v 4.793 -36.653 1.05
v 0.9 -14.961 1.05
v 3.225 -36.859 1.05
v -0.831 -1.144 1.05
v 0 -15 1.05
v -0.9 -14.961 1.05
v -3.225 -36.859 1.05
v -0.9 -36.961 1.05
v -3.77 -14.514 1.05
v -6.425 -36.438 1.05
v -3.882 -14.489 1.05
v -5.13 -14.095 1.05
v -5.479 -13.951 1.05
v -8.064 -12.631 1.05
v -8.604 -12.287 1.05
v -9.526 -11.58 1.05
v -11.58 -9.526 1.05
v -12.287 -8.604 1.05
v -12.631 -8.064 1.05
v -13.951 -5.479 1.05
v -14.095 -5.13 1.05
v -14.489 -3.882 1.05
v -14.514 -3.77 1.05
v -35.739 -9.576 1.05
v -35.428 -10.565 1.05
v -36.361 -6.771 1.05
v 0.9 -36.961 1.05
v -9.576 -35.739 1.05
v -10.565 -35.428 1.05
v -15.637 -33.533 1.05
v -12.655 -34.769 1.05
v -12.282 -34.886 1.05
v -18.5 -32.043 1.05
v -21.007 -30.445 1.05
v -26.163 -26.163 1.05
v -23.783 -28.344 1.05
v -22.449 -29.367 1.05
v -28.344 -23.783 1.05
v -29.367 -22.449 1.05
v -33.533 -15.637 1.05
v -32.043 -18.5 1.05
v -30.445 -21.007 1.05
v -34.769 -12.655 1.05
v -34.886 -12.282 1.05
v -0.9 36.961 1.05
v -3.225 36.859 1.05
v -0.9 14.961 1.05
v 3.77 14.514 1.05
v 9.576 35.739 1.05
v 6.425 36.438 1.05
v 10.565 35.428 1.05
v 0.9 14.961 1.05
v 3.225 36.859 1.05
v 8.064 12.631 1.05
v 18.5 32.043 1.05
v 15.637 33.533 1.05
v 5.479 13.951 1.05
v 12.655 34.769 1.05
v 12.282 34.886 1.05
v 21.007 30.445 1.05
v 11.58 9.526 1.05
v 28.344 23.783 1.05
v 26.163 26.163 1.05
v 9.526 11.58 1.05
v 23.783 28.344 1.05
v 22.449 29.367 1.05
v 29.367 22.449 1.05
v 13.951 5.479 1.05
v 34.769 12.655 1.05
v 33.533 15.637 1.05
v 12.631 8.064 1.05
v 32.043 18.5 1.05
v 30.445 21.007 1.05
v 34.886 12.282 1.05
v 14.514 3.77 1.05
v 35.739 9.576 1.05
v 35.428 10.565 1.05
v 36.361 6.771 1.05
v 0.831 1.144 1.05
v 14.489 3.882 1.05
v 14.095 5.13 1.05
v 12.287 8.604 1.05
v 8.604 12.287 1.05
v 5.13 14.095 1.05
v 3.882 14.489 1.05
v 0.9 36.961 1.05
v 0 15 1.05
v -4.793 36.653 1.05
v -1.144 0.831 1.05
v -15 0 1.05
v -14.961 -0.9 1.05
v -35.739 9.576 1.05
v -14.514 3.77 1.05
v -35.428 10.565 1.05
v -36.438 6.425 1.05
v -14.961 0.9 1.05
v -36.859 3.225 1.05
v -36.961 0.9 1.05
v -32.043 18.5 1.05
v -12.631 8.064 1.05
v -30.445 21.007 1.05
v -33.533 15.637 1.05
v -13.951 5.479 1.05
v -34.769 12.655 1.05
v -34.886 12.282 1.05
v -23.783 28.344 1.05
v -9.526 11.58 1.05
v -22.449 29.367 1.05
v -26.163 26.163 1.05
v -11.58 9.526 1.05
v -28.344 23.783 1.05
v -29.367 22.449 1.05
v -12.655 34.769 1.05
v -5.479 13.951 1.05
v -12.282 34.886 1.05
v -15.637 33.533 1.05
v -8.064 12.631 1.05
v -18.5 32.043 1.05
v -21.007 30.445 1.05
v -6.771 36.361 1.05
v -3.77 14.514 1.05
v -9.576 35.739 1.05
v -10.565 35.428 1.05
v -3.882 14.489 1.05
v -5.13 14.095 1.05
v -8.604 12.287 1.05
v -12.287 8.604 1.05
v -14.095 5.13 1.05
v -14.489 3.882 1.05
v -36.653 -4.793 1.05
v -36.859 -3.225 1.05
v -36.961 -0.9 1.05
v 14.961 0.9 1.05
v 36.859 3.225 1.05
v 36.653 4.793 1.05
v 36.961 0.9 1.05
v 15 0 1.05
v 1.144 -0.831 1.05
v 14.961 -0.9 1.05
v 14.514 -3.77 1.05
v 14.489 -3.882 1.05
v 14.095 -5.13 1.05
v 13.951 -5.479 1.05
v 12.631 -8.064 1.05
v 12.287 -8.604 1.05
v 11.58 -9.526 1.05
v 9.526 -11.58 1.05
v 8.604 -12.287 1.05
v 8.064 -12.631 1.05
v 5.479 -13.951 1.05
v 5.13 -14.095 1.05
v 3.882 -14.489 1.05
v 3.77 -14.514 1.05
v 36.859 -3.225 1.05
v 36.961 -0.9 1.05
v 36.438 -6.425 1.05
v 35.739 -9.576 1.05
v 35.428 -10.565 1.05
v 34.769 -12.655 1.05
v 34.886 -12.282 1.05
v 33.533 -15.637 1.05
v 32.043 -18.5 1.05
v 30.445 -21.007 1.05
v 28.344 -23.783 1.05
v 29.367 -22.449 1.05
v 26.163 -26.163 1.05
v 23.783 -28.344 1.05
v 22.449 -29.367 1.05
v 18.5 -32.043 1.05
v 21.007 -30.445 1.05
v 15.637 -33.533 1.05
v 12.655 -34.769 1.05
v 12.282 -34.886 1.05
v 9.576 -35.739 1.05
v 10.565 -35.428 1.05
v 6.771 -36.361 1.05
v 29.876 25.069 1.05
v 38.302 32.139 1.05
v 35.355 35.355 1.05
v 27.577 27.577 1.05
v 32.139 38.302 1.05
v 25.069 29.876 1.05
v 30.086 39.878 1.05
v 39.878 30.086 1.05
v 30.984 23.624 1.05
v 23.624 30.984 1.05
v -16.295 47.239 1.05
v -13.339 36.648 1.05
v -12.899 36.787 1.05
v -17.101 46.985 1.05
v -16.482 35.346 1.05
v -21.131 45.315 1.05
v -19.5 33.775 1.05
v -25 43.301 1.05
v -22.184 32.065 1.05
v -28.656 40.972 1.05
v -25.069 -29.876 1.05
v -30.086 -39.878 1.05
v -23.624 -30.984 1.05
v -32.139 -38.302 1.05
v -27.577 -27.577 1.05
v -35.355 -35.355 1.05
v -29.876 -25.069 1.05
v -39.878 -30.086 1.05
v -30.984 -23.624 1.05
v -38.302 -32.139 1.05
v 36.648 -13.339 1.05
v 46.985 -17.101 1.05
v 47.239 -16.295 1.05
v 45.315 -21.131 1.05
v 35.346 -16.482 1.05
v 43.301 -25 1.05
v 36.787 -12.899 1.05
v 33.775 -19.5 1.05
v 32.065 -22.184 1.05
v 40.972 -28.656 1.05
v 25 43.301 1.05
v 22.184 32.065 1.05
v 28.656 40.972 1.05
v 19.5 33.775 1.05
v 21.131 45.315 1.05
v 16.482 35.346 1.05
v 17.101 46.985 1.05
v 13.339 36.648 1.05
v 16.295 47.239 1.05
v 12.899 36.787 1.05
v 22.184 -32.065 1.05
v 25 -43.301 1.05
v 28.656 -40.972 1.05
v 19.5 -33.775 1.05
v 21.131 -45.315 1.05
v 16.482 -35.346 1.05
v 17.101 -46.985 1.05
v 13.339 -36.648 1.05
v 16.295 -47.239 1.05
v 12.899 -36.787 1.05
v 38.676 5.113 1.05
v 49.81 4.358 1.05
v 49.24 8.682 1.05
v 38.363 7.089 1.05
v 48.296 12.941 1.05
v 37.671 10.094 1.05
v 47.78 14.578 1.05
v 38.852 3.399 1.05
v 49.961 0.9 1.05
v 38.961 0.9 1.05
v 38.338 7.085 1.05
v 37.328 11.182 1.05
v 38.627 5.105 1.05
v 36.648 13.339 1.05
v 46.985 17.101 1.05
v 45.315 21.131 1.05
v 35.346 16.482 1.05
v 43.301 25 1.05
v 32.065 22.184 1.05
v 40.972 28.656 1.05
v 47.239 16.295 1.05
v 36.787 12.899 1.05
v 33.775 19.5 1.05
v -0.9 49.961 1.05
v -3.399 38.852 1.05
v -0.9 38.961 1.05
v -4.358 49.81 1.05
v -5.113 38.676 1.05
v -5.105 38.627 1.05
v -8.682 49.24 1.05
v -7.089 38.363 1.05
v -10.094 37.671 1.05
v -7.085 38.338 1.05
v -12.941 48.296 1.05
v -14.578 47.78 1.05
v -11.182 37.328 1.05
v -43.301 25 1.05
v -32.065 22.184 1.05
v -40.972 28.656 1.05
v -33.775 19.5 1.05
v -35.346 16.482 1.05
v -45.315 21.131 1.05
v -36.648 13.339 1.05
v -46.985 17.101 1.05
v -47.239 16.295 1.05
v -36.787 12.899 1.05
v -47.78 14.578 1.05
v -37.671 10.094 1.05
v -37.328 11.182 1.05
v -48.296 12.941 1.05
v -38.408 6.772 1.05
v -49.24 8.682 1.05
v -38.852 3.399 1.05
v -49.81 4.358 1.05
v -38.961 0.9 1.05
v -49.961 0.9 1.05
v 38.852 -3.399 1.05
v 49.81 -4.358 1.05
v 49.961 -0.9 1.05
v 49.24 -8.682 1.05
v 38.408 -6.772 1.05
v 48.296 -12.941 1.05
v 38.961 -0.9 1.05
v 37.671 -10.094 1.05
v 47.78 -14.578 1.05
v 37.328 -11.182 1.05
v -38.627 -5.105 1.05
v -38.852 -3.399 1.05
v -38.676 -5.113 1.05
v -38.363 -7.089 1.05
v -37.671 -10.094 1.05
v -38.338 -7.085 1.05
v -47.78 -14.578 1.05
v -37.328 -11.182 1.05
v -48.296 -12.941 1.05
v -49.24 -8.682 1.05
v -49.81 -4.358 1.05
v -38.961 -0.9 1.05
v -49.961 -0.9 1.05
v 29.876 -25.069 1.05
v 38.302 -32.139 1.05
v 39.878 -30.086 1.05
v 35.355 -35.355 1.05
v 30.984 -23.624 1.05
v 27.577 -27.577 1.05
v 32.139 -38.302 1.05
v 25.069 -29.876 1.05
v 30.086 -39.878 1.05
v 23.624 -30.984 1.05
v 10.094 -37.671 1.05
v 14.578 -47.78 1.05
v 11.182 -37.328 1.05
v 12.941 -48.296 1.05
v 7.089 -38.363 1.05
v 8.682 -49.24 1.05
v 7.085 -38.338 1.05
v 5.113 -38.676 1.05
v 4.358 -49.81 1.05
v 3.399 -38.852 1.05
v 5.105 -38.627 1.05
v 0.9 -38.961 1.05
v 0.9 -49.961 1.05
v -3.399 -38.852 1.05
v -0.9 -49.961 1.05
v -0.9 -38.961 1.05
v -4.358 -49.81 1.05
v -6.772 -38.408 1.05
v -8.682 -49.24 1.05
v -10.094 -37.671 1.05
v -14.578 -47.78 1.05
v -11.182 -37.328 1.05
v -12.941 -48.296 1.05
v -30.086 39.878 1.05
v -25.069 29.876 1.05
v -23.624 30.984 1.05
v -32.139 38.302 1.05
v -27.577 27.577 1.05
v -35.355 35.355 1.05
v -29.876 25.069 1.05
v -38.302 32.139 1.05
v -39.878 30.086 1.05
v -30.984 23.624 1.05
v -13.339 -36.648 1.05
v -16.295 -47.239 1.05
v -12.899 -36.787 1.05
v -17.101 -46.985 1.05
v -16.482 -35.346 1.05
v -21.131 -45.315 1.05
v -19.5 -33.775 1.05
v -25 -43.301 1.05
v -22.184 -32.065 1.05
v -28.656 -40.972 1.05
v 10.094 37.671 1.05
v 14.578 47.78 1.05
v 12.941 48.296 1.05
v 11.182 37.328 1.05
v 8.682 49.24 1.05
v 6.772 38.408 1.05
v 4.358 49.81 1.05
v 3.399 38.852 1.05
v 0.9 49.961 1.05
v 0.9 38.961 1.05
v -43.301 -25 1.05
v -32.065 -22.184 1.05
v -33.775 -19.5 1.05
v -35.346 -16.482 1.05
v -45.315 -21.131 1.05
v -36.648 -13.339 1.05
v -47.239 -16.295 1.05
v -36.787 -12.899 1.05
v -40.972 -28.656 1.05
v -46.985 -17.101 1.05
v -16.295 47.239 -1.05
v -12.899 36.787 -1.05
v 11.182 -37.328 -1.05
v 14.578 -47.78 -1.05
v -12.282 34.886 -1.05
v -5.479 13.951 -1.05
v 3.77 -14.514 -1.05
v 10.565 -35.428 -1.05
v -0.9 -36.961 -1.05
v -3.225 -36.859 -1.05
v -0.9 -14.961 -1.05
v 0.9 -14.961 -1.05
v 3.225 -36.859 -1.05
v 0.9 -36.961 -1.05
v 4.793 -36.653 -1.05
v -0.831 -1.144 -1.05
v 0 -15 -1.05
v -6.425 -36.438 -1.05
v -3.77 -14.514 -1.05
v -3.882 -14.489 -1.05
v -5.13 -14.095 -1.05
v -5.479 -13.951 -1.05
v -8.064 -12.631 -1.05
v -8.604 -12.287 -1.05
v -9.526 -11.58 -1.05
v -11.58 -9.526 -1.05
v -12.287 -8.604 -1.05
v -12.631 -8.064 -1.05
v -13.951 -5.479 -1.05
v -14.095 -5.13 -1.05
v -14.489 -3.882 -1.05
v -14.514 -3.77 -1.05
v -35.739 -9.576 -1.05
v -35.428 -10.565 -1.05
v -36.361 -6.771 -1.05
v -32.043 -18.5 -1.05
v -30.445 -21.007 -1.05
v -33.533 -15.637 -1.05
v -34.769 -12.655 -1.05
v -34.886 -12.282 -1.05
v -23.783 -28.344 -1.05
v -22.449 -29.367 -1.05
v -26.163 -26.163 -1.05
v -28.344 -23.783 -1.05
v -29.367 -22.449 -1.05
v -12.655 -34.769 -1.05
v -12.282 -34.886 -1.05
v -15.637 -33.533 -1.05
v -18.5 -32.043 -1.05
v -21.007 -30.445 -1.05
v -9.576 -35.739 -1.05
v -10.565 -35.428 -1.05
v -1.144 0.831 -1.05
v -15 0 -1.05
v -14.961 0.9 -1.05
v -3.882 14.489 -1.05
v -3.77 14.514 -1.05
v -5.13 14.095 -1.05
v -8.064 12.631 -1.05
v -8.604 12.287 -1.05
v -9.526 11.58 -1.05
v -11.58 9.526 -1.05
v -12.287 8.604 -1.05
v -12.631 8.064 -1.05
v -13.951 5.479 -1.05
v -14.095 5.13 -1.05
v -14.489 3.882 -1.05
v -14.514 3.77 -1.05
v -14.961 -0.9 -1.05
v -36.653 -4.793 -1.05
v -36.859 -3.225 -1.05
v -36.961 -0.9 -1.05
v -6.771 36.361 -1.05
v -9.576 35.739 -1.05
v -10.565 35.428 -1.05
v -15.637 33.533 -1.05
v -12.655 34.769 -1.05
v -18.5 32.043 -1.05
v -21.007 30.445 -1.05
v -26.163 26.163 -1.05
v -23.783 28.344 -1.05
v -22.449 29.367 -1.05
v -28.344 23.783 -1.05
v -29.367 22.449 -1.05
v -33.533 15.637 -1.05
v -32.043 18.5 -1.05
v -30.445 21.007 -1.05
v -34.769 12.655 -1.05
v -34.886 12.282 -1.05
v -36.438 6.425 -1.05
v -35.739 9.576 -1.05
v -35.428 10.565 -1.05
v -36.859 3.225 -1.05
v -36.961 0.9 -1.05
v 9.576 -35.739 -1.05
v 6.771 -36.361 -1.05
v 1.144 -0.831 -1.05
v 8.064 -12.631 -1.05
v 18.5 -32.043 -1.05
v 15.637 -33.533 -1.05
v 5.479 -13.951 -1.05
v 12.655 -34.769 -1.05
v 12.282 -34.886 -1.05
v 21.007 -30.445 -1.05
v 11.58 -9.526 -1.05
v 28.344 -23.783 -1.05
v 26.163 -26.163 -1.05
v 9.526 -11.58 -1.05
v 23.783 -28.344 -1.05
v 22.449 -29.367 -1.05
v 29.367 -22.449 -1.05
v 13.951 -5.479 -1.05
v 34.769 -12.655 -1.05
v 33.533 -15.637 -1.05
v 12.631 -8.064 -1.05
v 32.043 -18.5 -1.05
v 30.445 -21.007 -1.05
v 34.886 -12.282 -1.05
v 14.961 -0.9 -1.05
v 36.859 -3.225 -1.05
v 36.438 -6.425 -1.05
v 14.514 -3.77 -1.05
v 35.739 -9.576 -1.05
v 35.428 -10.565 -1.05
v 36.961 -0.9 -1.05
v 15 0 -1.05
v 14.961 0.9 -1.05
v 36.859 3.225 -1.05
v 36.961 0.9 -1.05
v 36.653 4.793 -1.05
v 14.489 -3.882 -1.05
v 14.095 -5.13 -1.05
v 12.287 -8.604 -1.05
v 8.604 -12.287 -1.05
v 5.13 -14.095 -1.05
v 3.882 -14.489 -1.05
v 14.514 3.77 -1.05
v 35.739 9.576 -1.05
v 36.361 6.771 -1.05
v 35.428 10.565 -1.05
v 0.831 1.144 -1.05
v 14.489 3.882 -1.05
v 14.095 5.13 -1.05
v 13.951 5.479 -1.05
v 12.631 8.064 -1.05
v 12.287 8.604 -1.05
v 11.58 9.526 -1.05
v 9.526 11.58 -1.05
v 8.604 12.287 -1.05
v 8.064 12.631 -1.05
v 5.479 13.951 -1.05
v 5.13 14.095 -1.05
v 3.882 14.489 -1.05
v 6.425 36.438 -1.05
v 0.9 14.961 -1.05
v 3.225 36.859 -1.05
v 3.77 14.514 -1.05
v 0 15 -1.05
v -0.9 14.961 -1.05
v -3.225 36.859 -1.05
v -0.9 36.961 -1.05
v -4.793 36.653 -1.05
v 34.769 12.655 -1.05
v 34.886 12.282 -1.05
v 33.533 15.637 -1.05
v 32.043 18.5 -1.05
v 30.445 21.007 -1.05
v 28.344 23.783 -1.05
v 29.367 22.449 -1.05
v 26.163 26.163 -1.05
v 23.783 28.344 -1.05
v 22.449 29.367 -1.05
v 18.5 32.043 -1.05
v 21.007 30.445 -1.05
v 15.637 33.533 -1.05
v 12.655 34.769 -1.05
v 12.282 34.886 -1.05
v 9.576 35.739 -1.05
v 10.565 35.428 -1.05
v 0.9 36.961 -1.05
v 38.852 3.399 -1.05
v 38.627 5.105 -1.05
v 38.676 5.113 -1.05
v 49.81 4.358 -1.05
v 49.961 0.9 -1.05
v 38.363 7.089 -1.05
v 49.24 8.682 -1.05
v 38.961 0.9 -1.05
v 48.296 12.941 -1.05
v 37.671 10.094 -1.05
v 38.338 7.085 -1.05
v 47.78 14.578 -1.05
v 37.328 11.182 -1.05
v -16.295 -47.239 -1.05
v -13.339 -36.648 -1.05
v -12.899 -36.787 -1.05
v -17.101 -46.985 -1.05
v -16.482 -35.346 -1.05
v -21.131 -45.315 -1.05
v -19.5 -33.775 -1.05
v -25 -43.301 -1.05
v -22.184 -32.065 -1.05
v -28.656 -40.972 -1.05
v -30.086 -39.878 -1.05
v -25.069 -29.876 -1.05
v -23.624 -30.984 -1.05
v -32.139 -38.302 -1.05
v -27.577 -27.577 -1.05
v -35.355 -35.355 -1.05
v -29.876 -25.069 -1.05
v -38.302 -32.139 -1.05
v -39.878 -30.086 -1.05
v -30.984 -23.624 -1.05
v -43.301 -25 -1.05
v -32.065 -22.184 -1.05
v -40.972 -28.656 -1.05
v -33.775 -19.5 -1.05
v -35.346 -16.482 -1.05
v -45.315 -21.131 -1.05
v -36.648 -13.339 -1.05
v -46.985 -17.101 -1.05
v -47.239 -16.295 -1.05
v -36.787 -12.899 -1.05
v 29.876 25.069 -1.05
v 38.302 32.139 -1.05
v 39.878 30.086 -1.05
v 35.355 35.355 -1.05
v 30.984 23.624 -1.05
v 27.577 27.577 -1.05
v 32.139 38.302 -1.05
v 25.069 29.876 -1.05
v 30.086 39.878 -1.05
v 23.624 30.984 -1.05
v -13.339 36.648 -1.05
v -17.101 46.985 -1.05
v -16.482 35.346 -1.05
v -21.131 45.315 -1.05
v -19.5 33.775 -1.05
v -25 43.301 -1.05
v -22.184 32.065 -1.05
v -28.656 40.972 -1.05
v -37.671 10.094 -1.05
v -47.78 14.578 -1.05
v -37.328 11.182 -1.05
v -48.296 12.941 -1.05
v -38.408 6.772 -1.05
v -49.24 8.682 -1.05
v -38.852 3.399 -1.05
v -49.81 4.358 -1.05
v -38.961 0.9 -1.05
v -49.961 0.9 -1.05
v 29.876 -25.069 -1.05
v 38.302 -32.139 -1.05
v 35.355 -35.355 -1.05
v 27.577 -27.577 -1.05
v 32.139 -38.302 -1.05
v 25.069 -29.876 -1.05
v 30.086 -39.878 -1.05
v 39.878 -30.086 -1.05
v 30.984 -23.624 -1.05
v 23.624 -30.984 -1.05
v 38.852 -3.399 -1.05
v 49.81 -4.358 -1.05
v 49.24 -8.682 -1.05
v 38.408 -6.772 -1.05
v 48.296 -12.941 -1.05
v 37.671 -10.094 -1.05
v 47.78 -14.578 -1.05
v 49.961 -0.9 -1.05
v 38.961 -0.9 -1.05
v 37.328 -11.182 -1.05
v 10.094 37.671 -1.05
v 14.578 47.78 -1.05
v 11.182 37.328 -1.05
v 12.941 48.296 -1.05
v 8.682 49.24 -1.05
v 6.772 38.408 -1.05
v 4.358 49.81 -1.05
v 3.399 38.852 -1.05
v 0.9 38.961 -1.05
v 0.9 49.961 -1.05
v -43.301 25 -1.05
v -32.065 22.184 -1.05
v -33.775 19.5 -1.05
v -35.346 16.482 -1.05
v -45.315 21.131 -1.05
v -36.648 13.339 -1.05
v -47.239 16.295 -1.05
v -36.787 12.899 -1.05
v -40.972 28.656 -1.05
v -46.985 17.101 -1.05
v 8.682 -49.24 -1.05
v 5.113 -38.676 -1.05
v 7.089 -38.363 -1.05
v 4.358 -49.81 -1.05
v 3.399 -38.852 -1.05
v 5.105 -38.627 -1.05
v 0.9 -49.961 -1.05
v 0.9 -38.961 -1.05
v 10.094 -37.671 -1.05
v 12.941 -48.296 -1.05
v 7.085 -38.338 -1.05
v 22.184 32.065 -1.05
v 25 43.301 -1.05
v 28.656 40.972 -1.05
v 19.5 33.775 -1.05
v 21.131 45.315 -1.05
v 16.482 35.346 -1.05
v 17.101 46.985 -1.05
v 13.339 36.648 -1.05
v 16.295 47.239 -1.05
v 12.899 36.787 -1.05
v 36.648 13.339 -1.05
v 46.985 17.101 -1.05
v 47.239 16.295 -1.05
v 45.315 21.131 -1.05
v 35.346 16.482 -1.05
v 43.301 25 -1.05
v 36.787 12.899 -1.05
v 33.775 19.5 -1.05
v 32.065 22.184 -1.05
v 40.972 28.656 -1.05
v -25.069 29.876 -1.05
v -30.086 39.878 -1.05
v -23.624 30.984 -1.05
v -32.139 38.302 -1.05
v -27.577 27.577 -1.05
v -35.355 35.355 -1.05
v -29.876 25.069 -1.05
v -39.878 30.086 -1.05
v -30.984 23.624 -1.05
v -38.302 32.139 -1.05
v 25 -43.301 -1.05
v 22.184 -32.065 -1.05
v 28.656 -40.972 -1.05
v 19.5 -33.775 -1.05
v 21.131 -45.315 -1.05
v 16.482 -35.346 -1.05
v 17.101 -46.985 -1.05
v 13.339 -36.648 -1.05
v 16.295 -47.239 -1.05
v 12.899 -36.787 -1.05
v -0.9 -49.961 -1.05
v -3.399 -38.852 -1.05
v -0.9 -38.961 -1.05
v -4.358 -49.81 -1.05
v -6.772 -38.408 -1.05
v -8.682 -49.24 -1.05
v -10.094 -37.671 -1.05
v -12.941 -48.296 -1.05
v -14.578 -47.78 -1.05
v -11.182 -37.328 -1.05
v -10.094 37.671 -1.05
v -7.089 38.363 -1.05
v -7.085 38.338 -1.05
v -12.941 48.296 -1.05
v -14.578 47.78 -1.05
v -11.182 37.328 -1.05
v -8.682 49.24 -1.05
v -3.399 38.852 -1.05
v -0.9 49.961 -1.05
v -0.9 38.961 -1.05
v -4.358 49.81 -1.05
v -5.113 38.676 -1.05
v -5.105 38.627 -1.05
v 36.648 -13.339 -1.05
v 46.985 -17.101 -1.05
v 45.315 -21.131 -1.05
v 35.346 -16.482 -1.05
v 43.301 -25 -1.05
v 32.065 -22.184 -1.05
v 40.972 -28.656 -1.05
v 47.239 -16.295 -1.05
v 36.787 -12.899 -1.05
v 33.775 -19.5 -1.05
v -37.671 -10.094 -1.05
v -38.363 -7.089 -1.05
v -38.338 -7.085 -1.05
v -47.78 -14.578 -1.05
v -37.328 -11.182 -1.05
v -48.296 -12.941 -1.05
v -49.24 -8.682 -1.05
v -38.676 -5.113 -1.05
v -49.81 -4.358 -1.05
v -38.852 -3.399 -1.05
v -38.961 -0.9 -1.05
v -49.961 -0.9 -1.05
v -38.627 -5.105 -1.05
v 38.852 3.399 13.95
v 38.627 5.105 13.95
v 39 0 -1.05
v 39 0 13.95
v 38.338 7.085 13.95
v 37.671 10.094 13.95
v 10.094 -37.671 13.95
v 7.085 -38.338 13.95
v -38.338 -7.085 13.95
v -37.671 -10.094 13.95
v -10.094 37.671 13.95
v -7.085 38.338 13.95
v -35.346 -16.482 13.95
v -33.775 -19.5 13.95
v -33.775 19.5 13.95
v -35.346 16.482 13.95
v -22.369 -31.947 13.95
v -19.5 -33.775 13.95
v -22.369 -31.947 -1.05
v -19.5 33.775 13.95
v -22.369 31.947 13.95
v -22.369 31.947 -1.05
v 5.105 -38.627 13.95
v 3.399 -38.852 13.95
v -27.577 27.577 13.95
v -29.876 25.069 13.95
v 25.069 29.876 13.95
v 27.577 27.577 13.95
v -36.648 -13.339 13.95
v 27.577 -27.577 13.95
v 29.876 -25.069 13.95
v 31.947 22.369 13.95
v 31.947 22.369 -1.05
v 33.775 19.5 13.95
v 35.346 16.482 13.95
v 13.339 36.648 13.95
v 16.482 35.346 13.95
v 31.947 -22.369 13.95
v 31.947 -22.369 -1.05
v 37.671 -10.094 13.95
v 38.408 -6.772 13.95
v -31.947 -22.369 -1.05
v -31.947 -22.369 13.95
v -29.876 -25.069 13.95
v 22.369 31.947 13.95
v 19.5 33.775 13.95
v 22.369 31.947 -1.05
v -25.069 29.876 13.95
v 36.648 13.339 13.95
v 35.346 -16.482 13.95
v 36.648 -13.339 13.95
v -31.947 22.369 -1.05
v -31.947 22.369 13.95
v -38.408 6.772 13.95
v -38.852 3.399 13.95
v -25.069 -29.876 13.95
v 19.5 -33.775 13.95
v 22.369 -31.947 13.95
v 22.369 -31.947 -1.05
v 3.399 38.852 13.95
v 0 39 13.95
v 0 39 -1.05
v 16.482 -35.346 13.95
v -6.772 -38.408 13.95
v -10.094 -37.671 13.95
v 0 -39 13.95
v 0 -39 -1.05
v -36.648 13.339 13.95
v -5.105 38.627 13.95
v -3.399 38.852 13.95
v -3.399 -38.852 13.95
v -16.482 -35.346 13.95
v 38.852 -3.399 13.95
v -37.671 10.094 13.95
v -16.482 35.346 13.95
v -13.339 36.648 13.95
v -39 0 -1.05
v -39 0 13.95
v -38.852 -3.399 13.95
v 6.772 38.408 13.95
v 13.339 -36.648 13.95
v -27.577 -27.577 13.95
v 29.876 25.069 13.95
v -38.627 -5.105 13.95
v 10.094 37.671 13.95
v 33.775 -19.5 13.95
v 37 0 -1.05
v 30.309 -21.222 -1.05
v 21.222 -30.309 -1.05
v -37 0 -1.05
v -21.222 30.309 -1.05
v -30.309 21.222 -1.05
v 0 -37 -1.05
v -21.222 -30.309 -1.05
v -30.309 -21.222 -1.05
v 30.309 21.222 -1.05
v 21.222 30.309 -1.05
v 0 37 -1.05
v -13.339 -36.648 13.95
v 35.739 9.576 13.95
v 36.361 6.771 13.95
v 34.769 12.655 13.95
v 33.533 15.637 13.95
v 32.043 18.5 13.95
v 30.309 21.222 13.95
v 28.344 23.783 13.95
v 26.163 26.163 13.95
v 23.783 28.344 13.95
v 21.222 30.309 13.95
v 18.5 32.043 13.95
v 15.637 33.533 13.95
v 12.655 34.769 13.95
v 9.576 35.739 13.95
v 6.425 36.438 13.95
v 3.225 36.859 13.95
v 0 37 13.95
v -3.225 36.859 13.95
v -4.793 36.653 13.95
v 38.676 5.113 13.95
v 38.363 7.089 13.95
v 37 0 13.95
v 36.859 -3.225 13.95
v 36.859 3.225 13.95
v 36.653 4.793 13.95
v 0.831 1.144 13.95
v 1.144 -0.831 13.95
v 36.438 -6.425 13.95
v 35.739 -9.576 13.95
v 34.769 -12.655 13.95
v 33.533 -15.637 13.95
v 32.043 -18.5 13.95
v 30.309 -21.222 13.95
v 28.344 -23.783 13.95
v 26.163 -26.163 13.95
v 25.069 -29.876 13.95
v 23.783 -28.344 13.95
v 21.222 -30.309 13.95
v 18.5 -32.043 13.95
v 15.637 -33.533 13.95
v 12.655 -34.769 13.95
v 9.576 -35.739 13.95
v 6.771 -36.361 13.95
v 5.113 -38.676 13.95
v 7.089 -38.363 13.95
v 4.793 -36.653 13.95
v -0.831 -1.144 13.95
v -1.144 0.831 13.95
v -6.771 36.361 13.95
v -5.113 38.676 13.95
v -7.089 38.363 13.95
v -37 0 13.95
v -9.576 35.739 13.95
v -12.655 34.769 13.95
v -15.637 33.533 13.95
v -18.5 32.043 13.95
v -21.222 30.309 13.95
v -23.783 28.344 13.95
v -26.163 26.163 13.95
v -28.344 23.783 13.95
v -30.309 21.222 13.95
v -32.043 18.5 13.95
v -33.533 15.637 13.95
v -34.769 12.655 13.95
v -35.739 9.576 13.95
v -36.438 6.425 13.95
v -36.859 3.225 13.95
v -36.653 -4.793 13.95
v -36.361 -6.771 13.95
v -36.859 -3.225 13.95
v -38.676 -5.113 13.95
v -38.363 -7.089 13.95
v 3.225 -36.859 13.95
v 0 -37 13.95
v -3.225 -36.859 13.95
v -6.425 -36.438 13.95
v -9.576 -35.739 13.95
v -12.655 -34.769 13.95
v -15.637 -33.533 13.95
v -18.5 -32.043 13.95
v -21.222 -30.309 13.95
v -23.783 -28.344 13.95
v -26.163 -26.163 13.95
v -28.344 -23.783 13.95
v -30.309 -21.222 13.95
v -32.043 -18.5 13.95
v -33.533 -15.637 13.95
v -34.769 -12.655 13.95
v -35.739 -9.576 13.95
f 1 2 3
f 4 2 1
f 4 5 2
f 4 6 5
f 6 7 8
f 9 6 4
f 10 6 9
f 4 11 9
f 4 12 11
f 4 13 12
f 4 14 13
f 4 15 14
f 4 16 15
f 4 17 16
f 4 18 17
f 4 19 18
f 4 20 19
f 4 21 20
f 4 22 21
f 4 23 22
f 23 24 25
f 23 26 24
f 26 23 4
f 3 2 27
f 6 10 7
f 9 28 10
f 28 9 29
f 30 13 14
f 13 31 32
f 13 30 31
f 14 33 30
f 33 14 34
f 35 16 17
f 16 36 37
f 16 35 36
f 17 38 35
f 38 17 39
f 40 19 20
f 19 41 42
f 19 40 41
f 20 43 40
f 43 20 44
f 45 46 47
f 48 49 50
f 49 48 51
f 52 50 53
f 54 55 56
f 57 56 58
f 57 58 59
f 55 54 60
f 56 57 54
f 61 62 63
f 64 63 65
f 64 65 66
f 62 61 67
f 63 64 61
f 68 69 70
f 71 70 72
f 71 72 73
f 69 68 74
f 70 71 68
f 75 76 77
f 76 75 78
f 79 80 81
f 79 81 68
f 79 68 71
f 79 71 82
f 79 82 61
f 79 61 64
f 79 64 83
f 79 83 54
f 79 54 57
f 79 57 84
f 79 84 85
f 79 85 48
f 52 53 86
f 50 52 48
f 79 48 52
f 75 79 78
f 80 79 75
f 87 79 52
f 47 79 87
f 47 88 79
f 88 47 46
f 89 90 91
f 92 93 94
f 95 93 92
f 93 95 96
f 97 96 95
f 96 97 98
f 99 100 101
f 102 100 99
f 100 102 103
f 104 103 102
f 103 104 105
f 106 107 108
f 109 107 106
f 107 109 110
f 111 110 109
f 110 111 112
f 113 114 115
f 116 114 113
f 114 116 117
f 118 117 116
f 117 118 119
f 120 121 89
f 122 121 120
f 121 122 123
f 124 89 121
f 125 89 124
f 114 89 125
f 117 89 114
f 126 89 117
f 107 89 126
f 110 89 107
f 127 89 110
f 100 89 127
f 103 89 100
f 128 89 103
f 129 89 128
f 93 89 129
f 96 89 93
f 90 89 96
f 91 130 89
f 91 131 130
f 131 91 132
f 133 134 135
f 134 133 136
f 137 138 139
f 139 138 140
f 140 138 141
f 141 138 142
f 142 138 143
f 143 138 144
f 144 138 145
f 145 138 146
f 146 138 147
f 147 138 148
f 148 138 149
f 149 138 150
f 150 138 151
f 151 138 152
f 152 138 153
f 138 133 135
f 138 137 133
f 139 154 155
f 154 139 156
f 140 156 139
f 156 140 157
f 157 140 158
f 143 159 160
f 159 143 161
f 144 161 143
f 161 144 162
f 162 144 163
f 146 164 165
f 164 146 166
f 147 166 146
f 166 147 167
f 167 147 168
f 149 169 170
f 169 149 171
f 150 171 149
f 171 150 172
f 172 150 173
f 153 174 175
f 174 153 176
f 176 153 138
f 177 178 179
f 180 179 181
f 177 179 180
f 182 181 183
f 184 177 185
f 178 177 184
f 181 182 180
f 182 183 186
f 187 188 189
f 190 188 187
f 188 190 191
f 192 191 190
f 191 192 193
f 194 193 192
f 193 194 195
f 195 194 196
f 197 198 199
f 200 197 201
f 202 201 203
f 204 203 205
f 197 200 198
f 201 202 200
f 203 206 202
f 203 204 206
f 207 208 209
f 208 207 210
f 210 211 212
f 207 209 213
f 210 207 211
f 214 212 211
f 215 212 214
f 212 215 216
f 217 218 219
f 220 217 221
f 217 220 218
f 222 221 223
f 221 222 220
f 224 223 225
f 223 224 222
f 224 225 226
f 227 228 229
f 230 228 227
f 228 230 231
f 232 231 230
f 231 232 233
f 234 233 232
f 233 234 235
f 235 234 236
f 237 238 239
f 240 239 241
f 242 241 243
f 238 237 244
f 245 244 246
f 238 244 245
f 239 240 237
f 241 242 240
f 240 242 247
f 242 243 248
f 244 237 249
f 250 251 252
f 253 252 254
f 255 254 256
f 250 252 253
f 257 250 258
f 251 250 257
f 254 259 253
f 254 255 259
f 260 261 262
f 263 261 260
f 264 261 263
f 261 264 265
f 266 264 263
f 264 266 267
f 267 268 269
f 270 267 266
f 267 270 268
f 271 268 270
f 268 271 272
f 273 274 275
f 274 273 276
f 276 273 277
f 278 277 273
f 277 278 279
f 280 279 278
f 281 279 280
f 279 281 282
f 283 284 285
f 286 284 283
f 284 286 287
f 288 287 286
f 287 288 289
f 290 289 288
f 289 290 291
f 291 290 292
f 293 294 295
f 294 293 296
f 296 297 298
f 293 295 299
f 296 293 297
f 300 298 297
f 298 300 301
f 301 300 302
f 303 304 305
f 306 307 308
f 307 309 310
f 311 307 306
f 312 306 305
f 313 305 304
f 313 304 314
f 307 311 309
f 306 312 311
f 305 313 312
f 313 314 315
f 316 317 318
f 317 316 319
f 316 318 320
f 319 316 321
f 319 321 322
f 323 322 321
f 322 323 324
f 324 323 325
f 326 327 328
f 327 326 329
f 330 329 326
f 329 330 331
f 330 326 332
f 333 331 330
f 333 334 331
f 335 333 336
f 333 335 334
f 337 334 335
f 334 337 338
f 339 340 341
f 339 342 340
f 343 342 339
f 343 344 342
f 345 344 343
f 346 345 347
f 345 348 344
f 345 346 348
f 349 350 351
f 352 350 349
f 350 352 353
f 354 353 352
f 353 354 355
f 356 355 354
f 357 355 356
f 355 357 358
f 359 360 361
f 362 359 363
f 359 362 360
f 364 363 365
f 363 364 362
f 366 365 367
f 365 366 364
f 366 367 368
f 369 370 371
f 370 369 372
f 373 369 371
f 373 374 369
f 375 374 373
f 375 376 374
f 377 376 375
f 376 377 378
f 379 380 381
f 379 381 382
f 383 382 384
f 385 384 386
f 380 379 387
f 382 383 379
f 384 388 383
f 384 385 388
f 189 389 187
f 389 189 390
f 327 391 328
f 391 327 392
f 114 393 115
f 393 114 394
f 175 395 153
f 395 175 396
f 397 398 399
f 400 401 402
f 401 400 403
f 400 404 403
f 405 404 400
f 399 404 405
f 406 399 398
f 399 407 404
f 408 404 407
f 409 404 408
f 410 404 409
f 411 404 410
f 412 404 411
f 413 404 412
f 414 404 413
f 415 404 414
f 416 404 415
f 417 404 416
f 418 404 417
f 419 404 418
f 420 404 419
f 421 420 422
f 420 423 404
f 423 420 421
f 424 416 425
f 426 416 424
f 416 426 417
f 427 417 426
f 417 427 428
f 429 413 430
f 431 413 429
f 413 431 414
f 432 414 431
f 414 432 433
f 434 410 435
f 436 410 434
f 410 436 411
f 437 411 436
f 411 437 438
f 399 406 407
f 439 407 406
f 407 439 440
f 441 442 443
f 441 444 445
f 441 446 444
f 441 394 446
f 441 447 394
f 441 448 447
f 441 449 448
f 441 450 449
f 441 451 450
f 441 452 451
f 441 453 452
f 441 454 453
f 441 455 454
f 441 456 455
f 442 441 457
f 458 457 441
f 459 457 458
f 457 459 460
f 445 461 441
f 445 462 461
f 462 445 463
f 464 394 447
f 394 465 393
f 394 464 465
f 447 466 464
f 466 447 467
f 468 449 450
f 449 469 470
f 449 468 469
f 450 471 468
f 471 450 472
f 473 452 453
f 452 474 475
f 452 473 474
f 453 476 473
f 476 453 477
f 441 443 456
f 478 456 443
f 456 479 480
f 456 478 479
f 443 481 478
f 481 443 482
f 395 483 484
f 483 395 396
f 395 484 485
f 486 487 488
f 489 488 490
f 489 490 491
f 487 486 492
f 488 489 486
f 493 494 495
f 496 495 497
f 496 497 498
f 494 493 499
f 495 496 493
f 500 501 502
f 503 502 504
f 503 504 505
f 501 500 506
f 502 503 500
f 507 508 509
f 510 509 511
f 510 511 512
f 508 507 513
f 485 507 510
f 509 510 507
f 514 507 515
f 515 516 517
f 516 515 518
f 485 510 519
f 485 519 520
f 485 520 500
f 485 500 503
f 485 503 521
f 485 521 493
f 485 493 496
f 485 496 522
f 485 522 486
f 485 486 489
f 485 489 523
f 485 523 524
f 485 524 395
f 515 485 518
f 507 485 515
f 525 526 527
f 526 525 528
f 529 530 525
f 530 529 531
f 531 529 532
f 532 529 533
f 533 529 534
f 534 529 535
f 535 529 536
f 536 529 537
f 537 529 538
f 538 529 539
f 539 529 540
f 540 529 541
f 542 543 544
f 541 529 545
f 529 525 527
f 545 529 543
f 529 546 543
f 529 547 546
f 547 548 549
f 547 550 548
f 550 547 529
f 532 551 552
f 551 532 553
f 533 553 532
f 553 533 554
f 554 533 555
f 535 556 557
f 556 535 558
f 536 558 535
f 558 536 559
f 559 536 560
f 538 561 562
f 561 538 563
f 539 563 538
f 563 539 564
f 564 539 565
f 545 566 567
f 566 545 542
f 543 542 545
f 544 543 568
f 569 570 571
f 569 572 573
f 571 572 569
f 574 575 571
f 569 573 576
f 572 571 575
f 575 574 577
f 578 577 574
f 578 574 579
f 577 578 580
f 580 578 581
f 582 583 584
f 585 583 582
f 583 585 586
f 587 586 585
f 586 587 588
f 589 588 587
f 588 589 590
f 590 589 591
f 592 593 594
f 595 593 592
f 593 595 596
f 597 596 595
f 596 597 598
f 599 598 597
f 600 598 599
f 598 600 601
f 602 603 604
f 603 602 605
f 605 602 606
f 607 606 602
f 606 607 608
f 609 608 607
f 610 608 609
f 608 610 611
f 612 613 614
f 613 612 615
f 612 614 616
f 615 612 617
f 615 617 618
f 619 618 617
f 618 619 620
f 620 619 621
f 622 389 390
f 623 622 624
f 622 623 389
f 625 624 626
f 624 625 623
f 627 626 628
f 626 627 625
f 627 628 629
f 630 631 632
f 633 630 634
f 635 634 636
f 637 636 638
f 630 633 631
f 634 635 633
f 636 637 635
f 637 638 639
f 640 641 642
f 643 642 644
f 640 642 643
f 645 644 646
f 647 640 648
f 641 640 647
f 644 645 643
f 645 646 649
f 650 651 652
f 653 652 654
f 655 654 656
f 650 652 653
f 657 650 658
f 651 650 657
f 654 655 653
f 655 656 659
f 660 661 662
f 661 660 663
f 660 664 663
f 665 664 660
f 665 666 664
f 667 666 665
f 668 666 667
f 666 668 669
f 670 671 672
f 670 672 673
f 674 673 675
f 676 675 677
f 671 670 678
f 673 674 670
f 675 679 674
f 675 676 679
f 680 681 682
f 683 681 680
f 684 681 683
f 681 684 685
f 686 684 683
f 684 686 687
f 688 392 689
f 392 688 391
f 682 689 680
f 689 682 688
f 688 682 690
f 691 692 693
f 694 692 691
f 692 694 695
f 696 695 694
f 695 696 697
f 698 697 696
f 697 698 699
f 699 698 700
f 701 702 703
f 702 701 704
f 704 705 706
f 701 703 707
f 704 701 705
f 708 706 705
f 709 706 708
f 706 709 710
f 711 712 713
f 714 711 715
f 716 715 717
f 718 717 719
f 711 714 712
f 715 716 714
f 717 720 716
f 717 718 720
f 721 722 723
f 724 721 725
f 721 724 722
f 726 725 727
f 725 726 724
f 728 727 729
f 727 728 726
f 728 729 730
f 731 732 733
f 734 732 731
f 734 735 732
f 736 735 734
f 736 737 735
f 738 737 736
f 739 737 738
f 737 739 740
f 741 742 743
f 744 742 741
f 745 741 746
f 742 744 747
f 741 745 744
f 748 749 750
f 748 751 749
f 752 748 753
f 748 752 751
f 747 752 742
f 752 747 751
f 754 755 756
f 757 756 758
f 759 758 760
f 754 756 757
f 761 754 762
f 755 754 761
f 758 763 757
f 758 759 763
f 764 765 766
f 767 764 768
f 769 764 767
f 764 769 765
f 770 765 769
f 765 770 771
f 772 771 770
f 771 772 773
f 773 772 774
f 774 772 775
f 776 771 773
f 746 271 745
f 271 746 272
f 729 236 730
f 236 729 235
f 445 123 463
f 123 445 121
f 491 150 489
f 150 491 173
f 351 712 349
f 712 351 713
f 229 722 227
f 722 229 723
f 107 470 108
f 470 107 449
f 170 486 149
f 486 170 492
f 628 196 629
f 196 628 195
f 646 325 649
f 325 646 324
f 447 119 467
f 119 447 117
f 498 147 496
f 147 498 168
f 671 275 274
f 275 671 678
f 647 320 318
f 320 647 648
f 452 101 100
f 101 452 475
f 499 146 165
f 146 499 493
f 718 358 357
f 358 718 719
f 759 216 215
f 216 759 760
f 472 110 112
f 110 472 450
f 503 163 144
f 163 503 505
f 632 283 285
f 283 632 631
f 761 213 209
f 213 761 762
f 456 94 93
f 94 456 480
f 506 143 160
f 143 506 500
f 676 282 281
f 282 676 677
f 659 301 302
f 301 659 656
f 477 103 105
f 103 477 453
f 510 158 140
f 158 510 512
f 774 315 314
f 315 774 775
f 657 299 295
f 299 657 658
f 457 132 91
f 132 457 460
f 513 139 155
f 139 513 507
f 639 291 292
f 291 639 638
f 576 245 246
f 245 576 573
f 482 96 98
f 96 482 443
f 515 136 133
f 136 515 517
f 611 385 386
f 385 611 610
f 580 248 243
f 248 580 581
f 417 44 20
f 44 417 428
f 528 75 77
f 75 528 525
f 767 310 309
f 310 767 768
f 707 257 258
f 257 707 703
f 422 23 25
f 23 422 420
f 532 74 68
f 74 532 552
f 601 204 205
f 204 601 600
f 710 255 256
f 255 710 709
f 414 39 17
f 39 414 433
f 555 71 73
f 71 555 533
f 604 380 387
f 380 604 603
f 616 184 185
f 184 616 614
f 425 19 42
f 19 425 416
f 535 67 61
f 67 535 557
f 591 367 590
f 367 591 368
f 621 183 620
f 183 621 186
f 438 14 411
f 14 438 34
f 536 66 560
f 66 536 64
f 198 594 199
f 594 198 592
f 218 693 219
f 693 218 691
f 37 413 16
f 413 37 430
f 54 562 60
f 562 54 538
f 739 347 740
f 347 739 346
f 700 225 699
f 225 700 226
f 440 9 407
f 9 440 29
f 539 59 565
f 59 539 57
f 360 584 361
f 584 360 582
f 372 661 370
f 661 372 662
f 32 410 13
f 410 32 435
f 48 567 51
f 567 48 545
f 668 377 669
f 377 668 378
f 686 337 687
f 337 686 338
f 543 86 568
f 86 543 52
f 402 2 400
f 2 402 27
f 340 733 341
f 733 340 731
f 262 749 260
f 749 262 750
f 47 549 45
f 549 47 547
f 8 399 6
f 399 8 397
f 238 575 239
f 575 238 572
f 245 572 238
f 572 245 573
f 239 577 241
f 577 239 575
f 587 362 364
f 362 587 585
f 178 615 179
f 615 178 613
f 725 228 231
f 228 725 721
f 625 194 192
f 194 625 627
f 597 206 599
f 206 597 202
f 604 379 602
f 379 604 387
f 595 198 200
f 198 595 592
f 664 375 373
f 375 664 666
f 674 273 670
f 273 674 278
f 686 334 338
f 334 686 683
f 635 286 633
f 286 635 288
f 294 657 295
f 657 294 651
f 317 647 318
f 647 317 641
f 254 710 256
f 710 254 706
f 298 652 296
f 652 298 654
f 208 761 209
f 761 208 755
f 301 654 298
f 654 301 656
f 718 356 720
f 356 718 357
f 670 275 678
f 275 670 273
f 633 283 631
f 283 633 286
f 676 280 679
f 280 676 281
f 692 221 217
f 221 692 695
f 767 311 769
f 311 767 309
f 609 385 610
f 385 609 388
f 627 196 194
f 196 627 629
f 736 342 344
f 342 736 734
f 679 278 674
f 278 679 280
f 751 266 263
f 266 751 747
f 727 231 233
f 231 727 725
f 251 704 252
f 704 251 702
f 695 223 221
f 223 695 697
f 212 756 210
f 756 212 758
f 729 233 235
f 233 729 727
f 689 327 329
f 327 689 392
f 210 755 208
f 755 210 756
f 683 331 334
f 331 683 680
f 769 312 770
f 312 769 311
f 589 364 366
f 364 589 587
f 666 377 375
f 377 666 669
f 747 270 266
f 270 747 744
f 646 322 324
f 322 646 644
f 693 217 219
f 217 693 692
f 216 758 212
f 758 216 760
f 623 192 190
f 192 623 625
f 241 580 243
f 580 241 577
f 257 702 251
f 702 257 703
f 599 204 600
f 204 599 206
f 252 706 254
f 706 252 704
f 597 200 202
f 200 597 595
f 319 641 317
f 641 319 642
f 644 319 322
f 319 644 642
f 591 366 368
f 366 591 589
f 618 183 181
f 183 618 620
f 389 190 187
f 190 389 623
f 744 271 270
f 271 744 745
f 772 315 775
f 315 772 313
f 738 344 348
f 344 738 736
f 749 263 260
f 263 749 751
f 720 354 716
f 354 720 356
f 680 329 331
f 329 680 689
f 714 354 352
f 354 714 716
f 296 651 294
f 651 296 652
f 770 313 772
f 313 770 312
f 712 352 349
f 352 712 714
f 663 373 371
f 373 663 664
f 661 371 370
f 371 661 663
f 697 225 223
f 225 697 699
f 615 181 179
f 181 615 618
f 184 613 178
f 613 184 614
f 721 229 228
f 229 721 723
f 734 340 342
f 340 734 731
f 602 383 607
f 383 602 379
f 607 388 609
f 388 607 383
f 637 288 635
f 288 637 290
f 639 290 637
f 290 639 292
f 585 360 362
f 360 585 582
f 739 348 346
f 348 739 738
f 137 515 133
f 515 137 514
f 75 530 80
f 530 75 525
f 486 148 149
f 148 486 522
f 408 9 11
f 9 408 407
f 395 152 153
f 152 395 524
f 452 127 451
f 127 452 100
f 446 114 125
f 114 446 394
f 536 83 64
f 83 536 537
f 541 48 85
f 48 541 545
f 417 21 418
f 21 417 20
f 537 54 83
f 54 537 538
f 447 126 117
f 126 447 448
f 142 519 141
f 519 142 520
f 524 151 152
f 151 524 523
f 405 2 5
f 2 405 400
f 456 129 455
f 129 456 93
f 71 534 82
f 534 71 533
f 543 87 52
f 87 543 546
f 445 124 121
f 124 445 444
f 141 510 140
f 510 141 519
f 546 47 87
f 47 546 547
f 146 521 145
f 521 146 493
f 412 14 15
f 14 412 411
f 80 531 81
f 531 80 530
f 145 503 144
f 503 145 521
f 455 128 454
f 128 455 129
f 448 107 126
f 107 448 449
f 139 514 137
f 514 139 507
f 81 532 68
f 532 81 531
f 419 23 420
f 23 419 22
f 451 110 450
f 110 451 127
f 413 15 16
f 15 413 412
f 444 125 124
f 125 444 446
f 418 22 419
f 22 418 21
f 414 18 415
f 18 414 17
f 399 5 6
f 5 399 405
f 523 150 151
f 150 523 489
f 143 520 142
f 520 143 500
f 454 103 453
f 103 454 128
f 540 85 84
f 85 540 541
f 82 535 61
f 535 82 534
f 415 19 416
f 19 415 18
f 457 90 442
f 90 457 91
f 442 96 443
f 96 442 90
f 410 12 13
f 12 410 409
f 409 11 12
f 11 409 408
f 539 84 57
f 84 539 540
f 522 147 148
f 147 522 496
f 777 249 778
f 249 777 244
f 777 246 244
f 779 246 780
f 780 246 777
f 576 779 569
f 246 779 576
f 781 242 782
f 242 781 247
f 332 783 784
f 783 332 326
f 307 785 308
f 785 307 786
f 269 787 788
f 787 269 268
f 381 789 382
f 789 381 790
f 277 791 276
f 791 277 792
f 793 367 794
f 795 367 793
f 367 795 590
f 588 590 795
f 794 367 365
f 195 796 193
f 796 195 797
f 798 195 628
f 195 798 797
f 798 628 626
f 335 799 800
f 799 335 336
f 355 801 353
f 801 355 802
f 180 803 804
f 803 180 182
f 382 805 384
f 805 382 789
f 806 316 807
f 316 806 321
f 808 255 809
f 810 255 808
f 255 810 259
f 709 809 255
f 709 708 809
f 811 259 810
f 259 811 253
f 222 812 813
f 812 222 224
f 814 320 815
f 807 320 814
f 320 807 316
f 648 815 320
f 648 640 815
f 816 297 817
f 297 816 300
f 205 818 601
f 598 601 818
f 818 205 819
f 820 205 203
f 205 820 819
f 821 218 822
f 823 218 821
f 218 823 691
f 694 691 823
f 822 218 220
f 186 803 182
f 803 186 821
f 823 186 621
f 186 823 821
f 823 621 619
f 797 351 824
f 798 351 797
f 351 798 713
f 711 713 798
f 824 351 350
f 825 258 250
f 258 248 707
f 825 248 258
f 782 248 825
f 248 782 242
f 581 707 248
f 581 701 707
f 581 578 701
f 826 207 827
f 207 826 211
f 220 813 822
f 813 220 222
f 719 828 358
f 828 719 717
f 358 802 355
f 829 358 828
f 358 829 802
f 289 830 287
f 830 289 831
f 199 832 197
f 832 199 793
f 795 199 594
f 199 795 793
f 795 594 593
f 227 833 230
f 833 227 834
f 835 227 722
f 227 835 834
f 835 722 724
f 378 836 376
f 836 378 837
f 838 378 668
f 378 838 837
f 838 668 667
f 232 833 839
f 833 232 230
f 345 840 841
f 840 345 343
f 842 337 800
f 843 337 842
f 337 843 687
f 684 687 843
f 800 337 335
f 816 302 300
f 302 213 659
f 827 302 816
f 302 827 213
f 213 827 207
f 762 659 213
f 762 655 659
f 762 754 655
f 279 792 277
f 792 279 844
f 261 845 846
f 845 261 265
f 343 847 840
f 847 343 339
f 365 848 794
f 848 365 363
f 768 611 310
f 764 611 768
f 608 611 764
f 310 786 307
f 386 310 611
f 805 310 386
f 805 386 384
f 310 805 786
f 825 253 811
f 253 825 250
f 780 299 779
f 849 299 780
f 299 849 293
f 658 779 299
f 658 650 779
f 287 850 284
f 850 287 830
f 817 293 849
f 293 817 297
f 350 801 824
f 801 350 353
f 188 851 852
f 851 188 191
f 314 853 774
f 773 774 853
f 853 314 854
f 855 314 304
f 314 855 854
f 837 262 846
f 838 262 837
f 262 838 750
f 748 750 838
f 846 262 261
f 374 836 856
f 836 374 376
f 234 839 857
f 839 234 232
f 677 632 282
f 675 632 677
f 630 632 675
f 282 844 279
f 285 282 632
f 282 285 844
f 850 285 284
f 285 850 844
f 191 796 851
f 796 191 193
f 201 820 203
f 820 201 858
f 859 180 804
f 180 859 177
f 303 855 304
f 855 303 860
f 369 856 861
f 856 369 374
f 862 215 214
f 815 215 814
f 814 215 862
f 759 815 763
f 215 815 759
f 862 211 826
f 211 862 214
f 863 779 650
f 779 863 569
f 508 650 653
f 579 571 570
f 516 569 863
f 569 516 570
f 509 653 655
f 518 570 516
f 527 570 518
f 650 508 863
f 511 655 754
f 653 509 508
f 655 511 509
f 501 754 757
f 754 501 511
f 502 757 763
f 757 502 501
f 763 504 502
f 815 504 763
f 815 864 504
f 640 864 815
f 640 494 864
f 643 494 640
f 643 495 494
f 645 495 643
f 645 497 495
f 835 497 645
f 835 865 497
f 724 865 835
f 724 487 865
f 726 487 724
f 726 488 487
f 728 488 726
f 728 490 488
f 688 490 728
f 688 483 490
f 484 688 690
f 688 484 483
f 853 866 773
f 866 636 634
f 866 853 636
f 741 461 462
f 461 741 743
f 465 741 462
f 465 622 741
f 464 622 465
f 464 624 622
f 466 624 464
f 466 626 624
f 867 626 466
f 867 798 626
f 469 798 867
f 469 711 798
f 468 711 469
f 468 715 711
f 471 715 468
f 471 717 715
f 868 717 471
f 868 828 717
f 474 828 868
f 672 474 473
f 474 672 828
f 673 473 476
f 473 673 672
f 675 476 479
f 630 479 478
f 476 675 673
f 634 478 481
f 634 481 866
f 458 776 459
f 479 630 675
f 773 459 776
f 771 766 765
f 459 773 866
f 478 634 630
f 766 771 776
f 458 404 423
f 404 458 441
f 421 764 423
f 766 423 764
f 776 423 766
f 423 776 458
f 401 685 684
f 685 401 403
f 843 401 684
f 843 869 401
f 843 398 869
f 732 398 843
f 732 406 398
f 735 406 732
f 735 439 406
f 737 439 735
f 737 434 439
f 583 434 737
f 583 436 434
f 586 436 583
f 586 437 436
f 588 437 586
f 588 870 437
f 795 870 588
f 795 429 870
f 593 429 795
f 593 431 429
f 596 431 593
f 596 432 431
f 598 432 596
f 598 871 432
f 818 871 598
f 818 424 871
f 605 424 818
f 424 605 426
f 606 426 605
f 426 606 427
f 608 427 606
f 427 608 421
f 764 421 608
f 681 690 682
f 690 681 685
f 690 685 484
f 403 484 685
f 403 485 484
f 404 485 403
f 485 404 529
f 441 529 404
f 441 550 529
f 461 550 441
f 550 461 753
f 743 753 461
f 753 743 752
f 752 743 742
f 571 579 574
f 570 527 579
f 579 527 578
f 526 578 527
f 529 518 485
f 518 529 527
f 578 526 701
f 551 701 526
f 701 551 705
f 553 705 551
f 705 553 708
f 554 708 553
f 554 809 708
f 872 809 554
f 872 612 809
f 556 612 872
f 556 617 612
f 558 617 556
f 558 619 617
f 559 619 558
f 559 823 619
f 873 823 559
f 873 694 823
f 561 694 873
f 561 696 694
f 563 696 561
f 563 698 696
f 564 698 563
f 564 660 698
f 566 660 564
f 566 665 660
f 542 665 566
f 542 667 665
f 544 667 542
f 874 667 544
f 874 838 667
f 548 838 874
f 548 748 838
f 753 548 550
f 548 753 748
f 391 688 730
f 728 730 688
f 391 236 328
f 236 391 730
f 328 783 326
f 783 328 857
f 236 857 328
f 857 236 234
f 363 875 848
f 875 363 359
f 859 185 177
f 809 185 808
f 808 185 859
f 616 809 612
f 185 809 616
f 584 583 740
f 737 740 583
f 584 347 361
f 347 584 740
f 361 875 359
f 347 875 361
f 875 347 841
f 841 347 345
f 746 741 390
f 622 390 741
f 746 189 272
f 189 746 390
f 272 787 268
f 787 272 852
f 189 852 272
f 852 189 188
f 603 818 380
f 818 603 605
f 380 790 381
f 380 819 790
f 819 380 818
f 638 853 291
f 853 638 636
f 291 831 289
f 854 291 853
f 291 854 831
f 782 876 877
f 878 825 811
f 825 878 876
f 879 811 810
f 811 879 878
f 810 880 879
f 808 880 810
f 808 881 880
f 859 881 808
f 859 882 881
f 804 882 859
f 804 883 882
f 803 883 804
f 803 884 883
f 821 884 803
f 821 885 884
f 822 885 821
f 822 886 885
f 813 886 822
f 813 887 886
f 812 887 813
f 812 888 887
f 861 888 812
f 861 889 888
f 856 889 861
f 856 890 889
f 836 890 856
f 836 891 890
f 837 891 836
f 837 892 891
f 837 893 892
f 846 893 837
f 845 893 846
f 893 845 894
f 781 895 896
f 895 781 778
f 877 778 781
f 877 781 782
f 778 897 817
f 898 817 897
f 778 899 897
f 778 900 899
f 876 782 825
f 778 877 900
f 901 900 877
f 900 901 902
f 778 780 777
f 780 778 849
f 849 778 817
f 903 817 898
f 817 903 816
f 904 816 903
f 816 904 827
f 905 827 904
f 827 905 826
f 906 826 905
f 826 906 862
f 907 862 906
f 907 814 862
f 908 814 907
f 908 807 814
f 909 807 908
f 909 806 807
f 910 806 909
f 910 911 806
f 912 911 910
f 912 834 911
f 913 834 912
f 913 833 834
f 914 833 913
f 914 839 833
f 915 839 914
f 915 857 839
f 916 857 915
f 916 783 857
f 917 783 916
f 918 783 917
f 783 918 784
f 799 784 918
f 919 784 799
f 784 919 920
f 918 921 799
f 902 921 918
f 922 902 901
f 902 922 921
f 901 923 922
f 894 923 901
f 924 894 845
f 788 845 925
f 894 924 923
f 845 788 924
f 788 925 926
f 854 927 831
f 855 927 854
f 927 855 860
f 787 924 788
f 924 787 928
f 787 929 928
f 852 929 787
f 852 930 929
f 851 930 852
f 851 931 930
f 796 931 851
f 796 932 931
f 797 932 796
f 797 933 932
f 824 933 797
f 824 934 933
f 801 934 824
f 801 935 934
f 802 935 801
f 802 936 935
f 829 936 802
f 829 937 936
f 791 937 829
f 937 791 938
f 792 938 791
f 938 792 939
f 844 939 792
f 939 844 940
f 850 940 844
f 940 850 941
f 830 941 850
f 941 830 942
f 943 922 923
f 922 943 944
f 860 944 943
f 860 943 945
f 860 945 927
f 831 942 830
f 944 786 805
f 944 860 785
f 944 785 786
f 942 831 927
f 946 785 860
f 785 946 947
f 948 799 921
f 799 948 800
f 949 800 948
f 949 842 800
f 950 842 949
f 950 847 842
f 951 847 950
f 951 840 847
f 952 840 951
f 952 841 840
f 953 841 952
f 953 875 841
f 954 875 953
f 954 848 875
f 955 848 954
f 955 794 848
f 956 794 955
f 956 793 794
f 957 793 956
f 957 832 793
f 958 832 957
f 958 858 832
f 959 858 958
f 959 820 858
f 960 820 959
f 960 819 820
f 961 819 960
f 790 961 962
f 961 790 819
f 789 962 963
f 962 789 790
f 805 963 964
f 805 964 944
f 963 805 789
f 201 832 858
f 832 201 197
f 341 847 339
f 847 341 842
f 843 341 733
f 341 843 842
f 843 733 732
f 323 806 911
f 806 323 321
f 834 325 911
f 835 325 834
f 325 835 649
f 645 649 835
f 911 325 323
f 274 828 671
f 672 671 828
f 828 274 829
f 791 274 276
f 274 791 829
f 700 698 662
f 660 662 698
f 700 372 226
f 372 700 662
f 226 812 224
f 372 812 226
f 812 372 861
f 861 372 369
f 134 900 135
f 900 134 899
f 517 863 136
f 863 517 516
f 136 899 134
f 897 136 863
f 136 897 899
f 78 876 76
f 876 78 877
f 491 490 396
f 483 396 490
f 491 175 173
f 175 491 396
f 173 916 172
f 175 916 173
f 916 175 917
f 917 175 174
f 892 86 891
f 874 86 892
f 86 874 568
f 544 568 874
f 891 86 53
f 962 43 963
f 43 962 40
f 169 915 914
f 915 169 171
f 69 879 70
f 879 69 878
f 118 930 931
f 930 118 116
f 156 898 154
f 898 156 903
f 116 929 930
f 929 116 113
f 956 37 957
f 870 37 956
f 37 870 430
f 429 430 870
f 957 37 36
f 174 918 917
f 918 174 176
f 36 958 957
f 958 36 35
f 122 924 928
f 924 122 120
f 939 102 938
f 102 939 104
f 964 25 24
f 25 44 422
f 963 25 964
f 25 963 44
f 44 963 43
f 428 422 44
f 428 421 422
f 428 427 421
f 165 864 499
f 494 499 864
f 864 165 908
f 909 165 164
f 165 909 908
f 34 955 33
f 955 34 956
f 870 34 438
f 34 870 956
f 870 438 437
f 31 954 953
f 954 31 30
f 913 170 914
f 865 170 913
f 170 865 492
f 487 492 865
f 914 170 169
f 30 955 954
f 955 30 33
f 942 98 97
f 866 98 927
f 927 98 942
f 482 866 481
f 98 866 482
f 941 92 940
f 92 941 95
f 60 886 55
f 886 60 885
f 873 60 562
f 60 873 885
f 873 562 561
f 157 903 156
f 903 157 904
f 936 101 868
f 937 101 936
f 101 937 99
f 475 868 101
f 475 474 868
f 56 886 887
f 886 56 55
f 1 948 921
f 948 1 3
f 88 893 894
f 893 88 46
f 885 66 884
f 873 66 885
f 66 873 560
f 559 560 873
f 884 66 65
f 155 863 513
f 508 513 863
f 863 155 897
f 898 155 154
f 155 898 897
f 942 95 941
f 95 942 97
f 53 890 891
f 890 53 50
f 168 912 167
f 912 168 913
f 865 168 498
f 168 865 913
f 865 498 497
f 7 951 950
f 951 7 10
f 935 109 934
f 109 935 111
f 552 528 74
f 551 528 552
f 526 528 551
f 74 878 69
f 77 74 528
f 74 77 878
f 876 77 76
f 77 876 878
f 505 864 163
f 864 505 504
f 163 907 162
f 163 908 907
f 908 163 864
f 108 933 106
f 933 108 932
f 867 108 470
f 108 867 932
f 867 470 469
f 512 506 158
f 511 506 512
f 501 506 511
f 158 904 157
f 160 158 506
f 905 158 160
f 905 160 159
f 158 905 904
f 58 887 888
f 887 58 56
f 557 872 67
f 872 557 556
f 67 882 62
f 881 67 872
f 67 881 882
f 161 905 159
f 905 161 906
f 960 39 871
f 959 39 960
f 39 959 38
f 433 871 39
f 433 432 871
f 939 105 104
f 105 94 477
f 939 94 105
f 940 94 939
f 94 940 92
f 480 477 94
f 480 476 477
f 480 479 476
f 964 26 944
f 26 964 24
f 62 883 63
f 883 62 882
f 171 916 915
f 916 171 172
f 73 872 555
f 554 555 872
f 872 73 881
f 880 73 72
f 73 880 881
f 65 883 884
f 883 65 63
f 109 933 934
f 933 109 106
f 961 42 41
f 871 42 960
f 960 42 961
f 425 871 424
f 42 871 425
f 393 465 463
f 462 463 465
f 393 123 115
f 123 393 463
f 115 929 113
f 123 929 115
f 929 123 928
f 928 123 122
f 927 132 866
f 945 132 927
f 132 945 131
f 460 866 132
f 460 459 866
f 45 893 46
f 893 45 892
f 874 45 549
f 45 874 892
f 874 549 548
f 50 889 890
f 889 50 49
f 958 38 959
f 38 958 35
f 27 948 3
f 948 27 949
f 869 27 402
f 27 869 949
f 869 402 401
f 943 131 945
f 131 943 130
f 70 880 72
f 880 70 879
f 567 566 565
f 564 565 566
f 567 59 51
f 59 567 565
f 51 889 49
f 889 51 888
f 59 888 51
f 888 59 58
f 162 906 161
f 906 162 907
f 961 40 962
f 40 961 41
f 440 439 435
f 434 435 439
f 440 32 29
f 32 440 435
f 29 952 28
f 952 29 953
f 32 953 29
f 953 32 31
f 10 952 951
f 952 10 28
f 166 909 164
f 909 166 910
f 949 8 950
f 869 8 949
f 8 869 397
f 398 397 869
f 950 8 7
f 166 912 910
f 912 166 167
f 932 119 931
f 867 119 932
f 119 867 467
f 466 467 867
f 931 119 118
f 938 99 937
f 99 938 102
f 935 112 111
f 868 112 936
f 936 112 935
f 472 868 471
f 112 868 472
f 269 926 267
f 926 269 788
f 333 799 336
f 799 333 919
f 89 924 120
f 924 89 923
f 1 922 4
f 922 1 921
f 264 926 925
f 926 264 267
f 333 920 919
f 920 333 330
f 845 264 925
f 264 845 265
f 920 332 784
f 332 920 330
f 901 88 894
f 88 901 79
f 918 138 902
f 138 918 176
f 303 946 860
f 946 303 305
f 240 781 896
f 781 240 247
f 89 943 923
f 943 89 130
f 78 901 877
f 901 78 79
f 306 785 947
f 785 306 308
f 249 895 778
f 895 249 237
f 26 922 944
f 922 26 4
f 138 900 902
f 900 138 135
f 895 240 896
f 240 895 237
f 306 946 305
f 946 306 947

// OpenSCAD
$fn=72;
/*[Hole]*/
hole_diameter=80.0;
/*[Cover]*/
extend_distance=10.0;//[10.0,15.0,20.0]
inner_diameter=30.0;
cover_thickness=2.1;//[1.8,2.1,2.4,2.7]
slit_width=1.8;//[1.5,1.8,2.1]
num_slit=10;//[8,10,12,14]
/*[Frame]*/
//gap between wall and frame (mm)
gap=1.0;//[0.5,1.0,1.5,2.0]
frame_thickness=2.0;//[1.5,2.0,2.5]
frame_height=15.0;//[10.0,15.0,20.0,25.0]

module cover0(hole_diameter,extend_distance,cover_thickness){
cylinder(cover_thickness,(hole_diameter+2*extend_distance)/2,(hole_diameter+2*extend_distance)/2,center=true);
}

module cover1(inner_diameter,cover_thickness){
cylinder(cover_thickness,inner_diameter/2,inner_diameter/2,center=true);
}

module slits(hole_diameter,extend_distance,cover_thickness,slit_width,num_slit){
    cube([slit_width,hole_diameter+2*extend_distance,cover_thickness],true);
    da=180.0/num_slit;
    for(i=[2:num_slit]){
        color("green")
        rotate([0,0,(i-1)*da])
         cube([slit_width,hole_diameter+2*extend_distance,cover_thickness],true);
        
        }
     }

module frame0(hole_diameter,frame_height,gap,frame_thickness){
difference(){
cylinder(frame_height,(hole_diameter-2*gap)/2,(hole_diameter-2*gap)/2,center=true);
cylinder(frame_height,(hole_diameter-2*gap-2*frame_thickness)/2,(hole_diameter-2*gap-2*frame_thickness)/2,center=true);    
}
}
module frame1(hole_diameter,frame_height,gap,frame_thickness){
    da=180.0/num_slit;
    rotate([0,0,0.5*da])
    cube([frame_thickness,hole_diameter-2*gap,frame_height],true);
    rotate([0,0,0.5*da+90.0])
    cube([frame_thickness,hole_diameter-2*gap,frame_height],true);
    
}


union(){ 
 union(){    
difference(){
    cover0(hole_diameter,extend_distance,cover_thickness);
    slits(hole_diameter,extend_distance,cover_thickness,slit_width,num_slit);
       
    }     
cover1(inner_diameter,cover_thickness);     
}


translate([0,0,(frame_height-cover_thickness)/2])
union(){
frame0(hole_diameter,frame_height,gap,frame_thickness);
frame1(hole_diameter,frame_height,gap,frame_thickness);
}
}
